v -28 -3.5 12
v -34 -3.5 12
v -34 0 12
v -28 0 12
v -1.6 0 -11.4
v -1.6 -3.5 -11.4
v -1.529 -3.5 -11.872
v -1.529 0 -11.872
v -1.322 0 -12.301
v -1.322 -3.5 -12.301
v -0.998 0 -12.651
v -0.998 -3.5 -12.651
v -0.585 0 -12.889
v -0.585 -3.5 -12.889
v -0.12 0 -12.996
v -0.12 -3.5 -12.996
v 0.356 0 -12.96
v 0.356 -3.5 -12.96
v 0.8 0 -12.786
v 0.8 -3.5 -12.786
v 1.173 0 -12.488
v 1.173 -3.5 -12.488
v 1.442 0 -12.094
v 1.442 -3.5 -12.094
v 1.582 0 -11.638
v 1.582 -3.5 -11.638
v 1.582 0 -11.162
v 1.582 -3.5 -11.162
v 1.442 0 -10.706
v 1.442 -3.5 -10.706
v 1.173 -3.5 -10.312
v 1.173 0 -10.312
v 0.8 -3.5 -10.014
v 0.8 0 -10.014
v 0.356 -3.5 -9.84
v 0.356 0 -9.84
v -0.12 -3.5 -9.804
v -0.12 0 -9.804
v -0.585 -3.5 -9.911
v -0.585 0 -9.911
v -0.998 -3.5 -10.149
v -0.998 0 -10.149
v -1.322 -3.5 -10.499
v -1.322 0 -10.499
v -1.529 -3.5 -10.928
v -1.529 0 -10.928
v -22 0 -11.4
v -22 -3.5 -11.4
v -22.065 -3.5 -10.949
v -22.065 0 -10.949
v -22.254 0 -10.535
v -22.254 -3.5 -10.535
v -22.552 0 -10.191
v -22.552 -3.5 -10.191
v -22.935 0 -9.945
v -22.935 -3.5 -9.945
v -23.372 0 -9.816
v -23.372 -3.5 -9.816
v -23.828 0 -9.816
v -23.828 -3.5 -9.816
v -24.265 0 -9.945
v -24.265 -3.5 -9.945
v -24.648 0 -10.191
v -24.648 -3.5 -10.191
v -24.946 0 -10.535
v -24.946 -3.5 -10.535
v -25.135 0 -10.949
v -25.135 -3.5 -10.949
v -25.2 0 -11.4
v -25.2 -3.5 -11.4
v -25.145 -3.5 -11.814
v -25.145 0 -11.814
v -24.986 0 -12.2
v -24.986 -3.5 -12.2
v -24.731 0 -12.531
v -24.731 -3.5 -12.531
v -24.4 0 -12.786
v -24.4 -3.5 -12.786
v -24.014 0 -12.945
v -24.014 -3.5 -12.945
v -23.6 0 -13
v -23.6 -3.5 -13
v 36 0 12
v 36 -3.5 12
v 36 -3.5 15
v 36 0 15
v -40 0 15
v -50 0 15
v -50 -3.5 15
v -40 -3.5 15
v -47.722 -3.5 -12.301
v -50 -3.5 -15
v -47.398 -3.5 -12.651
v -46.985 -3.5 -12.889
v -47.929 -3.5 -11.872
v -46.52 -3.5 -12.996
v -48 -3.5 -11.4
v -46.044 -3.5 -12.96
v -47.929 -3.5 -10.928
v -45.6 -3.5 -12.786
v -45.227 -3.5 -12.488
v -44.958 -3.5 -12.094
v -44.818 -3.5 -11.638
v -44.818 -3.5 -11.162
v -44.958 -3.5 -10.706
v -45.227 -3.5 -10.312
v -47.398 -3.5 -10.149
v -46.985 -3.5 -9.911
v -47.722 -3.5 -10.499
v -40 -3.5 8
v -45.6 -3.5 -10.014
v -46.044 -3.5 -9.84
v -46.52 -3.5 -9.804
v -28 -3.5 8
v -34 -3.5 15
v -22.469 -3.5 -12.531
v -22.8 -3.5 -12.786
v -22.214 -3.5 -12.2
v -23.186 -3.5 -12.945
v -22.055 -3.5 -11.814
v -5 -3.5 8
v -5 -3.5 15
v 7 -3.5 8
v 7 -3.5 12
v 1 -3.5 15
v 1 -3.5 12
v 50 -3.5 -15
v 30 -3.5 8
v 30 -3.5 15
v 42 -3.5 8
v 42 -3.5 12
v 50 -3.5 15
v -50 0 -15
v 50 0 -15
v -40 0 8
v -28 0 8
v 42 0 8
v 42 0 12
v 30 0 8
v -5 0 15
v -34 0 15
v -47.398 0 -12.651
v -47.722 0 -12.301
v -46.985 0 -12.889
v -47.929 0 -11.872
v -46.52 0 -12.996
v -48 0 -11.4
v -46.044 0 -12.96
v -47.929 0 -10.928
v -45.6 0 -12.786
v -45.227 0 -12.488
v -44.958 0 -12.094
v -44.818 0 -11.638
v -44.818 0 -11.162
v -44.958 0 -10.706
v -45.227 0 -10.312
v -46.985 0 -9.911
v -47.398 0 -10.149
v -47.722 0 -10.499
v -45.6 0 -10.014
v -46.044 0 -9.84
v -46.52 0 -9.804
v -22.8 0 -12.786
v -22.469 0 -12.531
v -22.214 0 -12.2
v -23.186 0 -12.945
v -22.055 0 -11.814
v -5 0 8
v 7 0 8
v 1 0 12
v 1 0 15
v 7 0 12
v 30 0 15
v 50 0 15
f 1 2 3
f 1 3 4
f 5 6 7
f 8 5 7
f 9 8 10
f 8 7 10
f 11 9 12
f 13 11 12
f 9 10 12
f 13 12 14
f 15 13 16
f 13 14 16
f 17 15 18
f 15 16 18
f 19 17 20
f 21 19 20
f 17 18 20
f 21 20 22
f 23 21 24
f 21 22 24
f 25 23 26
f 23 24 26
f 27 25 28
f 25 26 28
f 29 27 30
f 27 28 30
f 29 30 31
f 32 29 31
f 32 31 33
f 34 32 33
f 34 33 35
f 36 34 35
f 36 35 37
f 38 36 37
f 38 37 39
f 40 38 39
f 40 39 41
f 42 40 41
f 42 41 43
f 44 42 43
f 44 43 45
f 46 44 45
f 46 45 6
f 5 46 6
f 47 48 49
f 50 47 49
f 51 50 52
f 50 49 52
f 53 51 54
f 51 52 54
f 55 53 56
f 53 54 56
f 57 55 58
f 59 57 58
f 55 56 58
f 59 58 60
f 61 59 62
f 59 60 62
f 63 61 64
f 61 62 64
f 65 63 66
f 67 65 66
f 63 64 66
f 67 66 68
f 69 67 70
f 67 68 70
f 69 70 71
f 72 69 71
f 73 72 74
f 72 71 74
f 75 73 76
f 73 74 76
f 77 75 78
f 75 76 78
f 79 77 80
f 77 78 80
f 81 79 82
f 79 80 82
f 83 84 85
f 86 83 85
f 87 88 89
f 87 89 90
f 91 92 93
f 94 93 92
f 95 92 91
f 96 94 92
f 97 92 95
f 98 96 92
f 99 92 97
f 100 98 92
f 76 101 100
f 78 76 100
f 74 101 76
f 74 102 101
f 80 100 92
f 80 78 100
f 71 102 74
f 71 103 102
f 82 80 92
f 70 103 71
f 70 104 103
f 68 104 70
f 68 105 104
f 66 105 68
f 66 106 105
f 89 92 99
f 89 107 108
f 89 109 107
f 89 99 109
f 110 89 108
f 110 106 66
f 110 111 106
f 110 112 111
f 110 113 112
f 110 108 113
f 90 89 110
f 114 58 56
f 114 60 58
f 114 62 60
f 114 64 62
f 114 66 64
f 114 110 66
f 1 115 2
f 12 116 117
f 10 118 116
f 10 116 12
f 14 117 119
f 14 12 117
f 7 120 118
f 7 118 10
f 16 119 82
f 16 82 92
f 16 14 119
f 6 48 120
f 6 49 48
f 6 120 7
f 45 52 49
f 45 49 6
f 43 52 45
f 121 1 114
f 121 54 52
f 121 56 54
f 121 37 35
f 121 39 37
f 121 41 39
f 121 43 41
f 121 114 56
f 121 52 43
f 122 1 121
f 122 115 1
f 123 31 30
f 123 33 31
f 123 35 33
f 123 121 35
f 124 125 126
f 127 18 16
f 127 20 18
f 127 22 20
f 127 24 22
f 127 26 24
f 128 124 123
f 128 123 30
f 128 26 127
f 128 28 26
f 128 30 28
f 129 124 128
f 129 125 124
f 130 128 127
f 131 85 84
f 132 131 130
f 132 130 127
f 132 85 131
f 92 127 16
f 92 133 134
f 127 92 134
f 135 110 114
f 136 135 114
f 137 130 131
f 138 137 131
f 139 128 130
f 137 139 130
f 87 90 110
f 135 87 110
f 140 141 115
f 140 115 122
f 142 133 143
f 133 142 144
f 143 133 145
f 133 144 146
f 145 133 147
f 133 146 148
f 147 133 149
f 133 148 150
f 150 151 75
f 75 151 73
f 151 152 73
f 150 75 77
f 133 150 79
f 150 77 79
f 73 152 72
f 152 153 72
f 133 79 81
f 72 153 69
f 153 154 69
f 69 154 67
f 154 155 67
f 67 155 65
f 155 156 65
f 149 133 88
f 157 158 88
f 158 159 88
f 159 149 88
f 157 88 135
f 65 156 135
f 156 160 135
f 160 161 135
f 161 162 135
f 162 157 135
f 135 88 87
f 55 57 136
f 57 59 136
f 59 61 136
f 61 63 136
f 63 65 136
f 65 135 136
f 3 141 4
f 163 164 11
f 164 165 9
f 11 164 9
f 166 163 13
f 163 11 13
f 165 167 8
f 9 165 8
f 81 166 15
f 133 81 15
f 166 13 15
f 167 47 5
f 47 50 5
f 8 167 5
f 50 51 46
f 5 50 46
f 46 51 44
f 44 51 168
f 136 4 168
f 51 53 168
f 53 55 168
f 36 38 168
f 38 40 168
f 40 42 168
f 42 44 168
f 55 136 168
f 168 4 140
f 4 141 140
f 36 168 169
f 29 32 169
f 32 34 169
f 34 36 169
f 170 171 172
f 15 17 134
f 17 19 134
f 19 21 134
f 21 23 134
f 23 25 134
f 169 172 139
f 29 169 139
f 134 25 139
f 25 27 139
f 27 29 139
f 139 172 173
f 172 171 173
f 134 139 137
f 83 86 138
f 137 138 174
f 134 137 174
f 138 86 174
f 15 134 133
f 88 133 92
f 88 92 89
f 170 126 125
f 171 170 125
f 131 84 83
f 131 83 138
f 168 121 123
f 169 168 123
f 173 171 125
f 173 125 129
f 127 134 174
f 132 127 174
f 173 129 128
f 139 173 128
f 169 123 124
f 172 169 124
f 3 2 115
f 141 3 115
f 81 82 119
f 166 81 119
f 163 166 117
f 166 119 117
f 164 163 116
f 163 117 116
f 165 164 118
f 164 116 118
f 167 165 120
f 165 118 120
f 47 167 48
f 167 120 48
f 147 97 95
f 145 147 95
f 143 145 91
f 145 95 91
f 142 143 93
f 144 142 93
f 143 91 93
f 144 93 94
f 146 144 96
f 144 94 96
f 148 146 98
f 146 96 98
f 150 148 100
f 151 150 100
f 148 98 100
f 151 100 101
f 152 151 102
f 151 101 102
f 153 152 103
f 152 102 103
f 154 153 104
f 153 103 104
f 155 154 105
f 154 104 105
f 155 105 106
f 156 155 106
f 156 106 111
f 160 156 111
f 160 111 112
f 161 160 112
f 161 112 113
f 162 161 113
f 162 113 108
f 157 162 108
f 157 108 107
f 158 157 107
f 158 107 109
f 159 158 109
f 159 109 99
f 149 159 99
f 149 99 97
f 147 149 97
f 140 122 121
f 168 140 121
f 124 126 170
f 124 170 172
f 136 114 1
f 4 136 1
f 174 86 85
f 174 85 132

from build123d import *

# Parameters (mm, degrees)
F0_W     = 100
F0_H     = 30
F1_DEPTH = 3.5
F3_DEPTH = 3.501
F4_W     = 6
F4_H     = 4
F5_DEPTH = 3.501


with BuildPart() as f1:
    # F0 (on Front) → F1 (new body)
    with BuildSketch(Plane.XZ):
        Rectangle(F0_W, F0_H)
    extrude(amount=F1_DEPTH)

    # F2 (on face) → F3 (cut, through all)
    with BuildSketch(Plane.XZ.offset(3.5)):
        with BuildLine():
            ThreePointArc((-44.8, -11.4), (-46.4, -9.8), (-48, -11.4))
            Line((-48, -11.4), (-44.8, -11.4))
        make_face()
        with BuildLine():
            Line((-44.8, -11.4), (-48, -11.4))
            ThreePointArc((-48, -11.4), (-46.4, -13), (-44.8, -11.4))
        make_face()
        with BuildLine():
            Line((-23.6, -11.4), (-23.6, -13))
            ThreePointArc((-23.6, -13), (-22.4686291501, -12.5313708499), (-22, -11.4))
            Line((-22, -11.4), (-23.6, -11.4))
        make_face()
        with BuildLine():
            ThreePointArc((-25.2, -11.4), (-24.7313708499, -12.5313708499), (-23.6, -13))
            Line((-23.6, -13), (-23.6, -11.4))
            Line((-23.6, -11.4), (-25.2, -11.4))
        make_face()
        with BuildLine():
            Line((-25.2, -11.4), (-23.6, -11.4))
            Line((-23.6, -11.4), (-22, -11.4))
            ThreePointArc((-22, -11.4), (-23.6, -9.8), (-25.2, -11.4))
        make_face()
        with BuildLine():
            ThreePointArc((1.6, -11.4), (0, -9.8), (-1.6, -11.4))
            ThreePointArc((-1.6, -11.4), (0, -13), (1.6, -11.4))
        make_face()
    extrude(amount=-F3_DEPTH, mode=Mode.SUBTRACT)

    # F4 (on face) → F5 (cut, through all)
    with BuildSketch(Plane.XZ.offset(3.5)):
        Polygon((-34, 15), (-40, 15), (-40, 8), (-34, 8), (-34, 12), align=None)
        with Locations((-31, 10)):
            Rectangle(F4_W, F4_H)
        Polygon((1, 15), (-5, 15), (-5, 8), (1, 8), (1, 12), align=None)
        with Locations((4, 10)):
            Rectangle(F4_W, F4_H)
        Polygon((36, 15), (30, 15), (30, 8), (36, 8), (36, 12), align=None)
        with Locations((39, 10)):
            Rectangle(F4_W, F4_H)
    extrude(amount=-F5_DEPTH, mode=Mode.SUBTRACT)


solid = f1.part
